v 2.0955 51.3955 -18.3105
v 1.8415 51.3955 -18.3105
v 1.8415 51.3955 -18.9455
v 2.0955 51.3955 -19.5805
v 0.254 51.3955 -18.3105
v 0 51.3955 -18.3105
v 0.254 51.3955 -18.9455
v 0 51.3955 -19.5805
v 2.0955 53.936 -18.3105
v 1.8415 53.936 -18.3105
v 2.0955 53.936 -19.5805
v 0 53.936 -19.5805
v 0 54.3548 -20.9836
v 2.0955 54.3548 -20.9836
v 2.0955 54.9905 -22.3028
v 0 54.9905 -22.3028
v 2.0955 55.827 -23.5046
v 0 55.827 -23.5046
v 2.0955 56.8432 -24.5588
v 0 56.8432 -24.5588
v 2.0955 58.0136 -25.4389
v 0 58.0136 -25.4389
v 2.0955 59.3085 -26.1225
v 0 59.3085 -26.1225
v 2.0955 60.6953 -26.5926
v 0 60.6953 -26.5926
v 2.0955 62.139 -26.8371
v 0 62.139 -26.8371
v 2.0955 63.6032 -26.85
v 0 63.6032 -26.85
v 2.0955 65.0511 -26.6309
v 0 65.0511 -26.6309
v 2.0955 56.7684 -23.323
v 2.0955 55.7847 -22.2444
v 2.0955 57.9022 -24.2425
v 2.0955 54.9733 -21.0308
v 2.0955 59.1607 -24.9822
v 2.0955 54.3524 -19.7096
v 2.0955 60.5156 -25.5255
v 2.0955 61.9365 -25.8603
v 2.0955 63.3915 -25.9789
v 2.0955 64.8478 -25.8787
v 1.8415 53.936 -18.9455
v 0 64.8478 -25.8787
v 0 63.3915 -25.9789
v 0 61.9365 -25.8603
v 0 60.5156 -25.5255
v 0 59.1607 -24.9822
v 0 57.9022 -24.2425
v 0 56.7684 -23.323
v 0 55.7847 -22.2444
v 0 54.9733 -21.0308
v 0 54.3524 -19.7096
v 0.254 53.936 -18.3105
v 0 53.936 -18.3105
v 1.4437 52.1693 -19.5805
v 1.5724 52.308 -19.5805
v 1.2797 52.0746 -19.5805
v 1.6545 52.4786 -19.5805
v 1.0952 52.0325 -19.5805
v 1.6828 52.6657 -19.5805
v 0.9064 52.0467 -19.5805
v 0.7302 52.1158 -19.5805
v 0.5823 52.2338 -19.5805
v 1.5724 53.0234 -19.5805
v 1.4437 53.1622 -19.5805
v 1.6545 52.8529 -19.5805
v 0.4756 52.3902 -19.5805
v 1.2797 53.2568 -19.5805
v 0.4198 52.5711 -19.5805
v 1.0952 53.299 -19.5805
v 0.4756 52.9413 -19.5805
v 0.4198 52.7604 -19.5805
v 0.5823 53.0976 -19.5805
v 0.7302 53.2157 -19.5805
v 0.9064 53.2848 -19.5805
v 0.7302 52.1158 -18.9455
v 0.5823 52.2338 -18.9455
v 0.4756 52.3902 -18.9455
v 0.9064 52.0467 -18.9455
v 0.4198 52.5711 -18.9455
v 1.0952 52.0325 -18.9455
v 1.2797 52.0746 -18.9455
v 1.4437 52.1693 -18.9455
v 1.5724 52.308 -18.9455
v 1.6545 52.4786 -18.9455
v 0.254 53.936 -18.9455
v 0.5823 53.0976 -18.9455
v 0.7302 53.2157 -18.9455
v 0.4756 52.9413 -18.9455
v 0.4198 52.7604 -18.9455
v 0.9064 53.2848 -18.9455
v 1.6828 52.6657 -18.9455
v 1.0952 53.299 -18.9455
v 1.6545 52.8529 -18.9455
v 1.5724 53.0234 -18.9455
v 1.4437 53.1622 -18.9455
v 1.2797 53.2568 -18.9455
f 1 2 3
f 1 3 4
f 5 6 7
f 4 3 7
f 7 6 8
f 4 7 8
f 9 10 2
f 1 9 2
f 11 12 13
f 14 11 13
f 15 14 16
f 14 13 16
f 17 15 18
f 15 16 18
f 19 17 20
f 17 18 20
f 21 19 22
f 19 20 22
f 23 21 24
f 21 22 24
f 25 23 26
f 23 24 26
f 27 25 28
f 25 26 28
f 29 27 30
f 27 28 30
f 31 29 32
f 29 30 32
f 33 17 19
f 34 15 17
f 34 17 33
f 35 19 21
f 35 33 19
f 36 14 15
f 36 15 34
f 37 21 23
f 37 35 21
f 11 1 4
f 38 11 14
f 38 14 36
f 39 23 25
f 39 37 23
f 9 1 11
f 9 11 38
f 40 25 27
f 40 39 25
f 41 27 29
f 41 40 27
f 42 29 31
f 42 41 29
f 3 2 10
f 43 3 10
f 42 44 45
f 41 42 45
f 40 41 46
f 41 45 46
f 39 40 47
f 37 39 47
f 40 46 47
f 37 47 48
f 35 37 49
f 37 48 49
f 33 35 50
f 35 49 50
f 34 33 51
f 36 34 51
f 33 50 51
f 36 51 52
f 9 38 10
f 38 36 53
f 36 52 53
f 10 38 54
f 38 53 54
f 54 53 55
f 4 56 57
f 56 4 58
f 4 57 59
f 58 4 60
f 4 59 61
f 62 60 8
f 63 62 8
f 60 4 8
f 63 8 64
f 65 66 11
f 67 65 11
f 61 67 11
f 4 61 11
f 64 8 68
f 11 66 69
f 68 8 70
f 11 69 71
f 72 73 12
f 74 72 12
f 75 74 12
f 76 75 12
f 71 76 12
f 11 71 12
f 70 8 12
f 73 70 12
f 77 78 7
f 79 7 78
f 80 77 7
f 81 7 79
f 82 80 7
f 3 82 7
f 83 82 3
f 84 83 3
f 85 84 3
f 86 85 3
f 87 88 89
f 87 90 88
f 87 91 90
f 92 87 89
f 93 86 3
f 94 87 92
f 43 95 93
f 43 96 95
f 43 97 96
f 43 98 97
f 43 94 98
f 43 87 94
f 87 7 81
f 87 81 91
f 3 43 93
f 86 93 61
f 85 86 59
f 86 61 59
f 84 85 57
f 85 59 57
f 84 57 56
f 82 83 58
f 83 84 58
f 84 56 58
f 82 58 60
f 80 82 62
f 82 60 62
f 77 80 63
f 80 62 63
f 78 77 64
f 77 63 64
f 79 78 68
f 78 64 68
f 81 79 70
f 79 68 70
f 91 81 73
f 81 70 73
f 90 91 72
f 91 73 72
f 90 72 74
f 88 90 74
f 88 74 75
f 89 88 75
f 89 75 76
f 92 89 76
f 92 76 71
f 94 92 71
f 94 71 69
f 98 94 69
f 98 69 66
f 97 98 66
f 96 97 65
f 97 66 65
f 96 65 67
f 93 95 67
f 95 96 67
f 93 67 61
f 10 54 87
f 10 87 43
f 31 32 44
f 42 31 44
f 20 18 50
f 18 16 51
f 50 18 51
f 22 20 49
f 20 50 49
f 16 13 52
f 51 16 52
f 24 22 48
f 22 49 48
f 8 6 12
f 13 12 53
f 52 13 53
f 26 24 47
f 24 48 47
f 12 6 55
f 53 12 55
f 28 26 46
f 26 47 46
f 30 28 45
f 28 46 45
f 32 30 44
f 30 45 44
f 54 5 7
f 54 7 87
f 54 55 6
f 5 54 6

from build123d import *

# Parameters (mm, degrees)
F1_DEPTH = 2.0955
F2_R     = 0.635
F3_DEPTH = 25.4
F4_W     = 1.5875
F4_H     = 2.5404572
F4_R     = 0.635
F5_DEPTH = 0.635


# Not quite as in the source:
# - a feature names something its author has since deleted; it is built from what else it names


with BuildPart() as f1:
    # F0 (on Right) → F1 (new body)
    with BuildSketch(Plane.YZ):
        with BuildLine():
            Line((51.3955118105, -18.3105177657), (51.3955118105, -19.5805177657))
            Line((51.3955118105, -19.5805177657), (53.9359690105, -19.5805177657))
            ThreePointArc((53.9359690105, -19.5805177657), (58.0135640106, -25.4388820379), (65.0510564446, -26.6309026629))
            Line((65.0510564446, -26.6309026629), (64.8478195071, -25.8786771446))
            ThreePointArc((64.8478195071, -25.8786771446), (57.9021718289, -24.2424946681), (53.9359690105, -18.3105177657))
            Line((53.9359690105, -18.3105177657), (51.3955118105, -18.3105177657))
        make_face()
    extrude(amount=F1_DEPTH)

    # F2 (on face) → F3 (cut)
    with BuildSketch(Plane(origin=(0, 0, -19.5805177657), x_dir=(1, 0, 0), z_dir=(0, 0, -1))):
        with Locations((1.04775, -52.6657345776)):
            Circle(F2_R)
    extrude(amount=-F3_DEPTH, mode=Mode.SUBTRACT)

    # F4 (on face) → F5 (cut)
    with BuildSketch(Plane.XY.offset(-18.3105177657)):
        with Locations((1.04775, 52.6657404105)):
            Rectangle(F4_W, F4_H)
        with Locations((1.04775, 52.6657345776)):
            Circle(F4_R, mode=Mode.SUBTRACT)
    extrude(amount=-F5_DEPTH, mode=Mode.SUBTRACT)


solid = f1.part
